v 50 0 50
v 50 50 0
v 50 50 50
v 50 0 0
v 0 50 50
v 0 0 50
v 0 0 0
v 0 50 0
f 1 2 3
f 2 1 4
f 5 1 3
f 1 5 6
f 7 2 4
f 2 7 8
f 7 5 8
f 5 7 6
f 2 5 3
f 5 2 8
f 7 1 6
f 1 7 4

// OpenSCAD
// Only the first corner of the cube has zero/negative value.

module labeled_cube(corner, size) {
  translate(corner) {
    color([1, 1, 1, 0.5]) cube(size); // create a transparent cube with the given size, centered at the given corner coordinates

    // label the corner points
    translate([0, 0, -5]) rotate([90, 0, 0]) text("C0", size=5);
    translate([size[0], 0, -5]) rotate([90, 0, 0]) text("C1", size=5);
    translate([size[0], size[1], -5]) rotate([90, 0, 0]) text("C2", size=5);
    translate([0, size[1], -5]) rotate([90, 0, 0]) text("C3", size=5);
    translate([0, 0, size[2]]) rotate([90, 0, 0]) text("C4", size=5);
    translate([size[0], 0, size[2]]) rotate([90, 0, 0]) text("C5", size=5);
    translate([size[0], size[1], size[2]]) rotate([90, 0, 0]) text("C6", size=5);
    translate([0, size[1], size[2]]) rotate([90, 0, 0]) text("C7", size=5);
  }
}

module divide_cube_into_tetrahedra(cube_size, alpha=0.5, colors=[
    [1, 0, 0, alpha],  // red
    [0, 1, 0, alpha],  // green
    [0, 0, 1, alpha],  // blue
    [1, 1, 0, alpha],  // yellow
    [1, 0, 1, alpha],  // magenta
    [0, 1, 1, alpha]   // cyan
]) {
    // Define the vertices of the cube
    cube_vertices = [
        [0, 0, 0],
        [cube_size, 0, 0],
        [cube_size, cube_size, 0],
        [0, cube_size, 0],
        [0, 0, cube_size],
        [cube_size, 0, cube_size],
        [0, cube_size, cube_size],
        [cube_size, cube_size, cube_size],
    ];

    tetrahedron_indices = [
        [0, 4, 6, 7],
        [0, 3, 6, 7],
        [0, 4, 5, 7],
        [0, 1, 5, 7],
        [0, 3, 2, 7],
        [0, 1, 2, 7],
    ];

    // Define the tetrahedra by selecting vertices from the cube
    for (i = [0:5]) {
        // Define the indices of the vertices for the tetrahedron
        vertex_indices = tetrahedron_indices[i];

        // Define the vertices of the tetrahedron
        tetrahedron_vertices = [
            cube_vertices[vertex_indices[0]],
            cube_vertices[vertex_indices[1]],
            cube_vertices[vertex_indices[2]],
            cube_vertices[vertex_indices[3]]
        ];

        // Color the tetrahedron with the specified color
        color(colors[i]) polyhedron(points=tetrahedron_vertices, faces=[[0, 1, 2], [0, 2, 3], [0, 3, 1], [1, 2, 3]]);
    }

    // Draw the cube
    color([1, 1, 1, 0]) cube(cube_size);
}

module labeled_and_divided_cube(cube_size, alpha=0.5, colors=[
    [1, 0, 0, alpha],  // red
    [0, 1, 0, alpha],  // green
    [0, 0, 1, alpha],  // blue
    [1, 1, 0, alpha],  // yellow
    [1, 0, 1, alpha],  // magenta
    [0, 1, 1, alpha]   // cyan
]) {
    // Define the center of the cube
    center = [cube_size/2, cube_size/2, cube_size/2];

    // Label the corners of the cube
    labeled_cube([0, 0, 0], [cube_size, cube_size, cube_size]);

    // Divide the cube into tetrahedra
    divide_cube_into_tetrahedra(cube_size, alpha, colors);
}

// Example usage of the module
cube_size = 50;
alpha = 0.5;
colors = [
    [1, 0, 0, alpha],  // red
    [0, 1, 0, alpha],  // green
    [0, 0, 1, alpha],  // blue
    [1, 1, 0, alpha],  // yellow
    [1, 0, 1, alpha],  // magenta
    [0, 1, 1, alpha]   // cyan
];

labeled_and_divided_cube(cube_size, alpha, colors);
